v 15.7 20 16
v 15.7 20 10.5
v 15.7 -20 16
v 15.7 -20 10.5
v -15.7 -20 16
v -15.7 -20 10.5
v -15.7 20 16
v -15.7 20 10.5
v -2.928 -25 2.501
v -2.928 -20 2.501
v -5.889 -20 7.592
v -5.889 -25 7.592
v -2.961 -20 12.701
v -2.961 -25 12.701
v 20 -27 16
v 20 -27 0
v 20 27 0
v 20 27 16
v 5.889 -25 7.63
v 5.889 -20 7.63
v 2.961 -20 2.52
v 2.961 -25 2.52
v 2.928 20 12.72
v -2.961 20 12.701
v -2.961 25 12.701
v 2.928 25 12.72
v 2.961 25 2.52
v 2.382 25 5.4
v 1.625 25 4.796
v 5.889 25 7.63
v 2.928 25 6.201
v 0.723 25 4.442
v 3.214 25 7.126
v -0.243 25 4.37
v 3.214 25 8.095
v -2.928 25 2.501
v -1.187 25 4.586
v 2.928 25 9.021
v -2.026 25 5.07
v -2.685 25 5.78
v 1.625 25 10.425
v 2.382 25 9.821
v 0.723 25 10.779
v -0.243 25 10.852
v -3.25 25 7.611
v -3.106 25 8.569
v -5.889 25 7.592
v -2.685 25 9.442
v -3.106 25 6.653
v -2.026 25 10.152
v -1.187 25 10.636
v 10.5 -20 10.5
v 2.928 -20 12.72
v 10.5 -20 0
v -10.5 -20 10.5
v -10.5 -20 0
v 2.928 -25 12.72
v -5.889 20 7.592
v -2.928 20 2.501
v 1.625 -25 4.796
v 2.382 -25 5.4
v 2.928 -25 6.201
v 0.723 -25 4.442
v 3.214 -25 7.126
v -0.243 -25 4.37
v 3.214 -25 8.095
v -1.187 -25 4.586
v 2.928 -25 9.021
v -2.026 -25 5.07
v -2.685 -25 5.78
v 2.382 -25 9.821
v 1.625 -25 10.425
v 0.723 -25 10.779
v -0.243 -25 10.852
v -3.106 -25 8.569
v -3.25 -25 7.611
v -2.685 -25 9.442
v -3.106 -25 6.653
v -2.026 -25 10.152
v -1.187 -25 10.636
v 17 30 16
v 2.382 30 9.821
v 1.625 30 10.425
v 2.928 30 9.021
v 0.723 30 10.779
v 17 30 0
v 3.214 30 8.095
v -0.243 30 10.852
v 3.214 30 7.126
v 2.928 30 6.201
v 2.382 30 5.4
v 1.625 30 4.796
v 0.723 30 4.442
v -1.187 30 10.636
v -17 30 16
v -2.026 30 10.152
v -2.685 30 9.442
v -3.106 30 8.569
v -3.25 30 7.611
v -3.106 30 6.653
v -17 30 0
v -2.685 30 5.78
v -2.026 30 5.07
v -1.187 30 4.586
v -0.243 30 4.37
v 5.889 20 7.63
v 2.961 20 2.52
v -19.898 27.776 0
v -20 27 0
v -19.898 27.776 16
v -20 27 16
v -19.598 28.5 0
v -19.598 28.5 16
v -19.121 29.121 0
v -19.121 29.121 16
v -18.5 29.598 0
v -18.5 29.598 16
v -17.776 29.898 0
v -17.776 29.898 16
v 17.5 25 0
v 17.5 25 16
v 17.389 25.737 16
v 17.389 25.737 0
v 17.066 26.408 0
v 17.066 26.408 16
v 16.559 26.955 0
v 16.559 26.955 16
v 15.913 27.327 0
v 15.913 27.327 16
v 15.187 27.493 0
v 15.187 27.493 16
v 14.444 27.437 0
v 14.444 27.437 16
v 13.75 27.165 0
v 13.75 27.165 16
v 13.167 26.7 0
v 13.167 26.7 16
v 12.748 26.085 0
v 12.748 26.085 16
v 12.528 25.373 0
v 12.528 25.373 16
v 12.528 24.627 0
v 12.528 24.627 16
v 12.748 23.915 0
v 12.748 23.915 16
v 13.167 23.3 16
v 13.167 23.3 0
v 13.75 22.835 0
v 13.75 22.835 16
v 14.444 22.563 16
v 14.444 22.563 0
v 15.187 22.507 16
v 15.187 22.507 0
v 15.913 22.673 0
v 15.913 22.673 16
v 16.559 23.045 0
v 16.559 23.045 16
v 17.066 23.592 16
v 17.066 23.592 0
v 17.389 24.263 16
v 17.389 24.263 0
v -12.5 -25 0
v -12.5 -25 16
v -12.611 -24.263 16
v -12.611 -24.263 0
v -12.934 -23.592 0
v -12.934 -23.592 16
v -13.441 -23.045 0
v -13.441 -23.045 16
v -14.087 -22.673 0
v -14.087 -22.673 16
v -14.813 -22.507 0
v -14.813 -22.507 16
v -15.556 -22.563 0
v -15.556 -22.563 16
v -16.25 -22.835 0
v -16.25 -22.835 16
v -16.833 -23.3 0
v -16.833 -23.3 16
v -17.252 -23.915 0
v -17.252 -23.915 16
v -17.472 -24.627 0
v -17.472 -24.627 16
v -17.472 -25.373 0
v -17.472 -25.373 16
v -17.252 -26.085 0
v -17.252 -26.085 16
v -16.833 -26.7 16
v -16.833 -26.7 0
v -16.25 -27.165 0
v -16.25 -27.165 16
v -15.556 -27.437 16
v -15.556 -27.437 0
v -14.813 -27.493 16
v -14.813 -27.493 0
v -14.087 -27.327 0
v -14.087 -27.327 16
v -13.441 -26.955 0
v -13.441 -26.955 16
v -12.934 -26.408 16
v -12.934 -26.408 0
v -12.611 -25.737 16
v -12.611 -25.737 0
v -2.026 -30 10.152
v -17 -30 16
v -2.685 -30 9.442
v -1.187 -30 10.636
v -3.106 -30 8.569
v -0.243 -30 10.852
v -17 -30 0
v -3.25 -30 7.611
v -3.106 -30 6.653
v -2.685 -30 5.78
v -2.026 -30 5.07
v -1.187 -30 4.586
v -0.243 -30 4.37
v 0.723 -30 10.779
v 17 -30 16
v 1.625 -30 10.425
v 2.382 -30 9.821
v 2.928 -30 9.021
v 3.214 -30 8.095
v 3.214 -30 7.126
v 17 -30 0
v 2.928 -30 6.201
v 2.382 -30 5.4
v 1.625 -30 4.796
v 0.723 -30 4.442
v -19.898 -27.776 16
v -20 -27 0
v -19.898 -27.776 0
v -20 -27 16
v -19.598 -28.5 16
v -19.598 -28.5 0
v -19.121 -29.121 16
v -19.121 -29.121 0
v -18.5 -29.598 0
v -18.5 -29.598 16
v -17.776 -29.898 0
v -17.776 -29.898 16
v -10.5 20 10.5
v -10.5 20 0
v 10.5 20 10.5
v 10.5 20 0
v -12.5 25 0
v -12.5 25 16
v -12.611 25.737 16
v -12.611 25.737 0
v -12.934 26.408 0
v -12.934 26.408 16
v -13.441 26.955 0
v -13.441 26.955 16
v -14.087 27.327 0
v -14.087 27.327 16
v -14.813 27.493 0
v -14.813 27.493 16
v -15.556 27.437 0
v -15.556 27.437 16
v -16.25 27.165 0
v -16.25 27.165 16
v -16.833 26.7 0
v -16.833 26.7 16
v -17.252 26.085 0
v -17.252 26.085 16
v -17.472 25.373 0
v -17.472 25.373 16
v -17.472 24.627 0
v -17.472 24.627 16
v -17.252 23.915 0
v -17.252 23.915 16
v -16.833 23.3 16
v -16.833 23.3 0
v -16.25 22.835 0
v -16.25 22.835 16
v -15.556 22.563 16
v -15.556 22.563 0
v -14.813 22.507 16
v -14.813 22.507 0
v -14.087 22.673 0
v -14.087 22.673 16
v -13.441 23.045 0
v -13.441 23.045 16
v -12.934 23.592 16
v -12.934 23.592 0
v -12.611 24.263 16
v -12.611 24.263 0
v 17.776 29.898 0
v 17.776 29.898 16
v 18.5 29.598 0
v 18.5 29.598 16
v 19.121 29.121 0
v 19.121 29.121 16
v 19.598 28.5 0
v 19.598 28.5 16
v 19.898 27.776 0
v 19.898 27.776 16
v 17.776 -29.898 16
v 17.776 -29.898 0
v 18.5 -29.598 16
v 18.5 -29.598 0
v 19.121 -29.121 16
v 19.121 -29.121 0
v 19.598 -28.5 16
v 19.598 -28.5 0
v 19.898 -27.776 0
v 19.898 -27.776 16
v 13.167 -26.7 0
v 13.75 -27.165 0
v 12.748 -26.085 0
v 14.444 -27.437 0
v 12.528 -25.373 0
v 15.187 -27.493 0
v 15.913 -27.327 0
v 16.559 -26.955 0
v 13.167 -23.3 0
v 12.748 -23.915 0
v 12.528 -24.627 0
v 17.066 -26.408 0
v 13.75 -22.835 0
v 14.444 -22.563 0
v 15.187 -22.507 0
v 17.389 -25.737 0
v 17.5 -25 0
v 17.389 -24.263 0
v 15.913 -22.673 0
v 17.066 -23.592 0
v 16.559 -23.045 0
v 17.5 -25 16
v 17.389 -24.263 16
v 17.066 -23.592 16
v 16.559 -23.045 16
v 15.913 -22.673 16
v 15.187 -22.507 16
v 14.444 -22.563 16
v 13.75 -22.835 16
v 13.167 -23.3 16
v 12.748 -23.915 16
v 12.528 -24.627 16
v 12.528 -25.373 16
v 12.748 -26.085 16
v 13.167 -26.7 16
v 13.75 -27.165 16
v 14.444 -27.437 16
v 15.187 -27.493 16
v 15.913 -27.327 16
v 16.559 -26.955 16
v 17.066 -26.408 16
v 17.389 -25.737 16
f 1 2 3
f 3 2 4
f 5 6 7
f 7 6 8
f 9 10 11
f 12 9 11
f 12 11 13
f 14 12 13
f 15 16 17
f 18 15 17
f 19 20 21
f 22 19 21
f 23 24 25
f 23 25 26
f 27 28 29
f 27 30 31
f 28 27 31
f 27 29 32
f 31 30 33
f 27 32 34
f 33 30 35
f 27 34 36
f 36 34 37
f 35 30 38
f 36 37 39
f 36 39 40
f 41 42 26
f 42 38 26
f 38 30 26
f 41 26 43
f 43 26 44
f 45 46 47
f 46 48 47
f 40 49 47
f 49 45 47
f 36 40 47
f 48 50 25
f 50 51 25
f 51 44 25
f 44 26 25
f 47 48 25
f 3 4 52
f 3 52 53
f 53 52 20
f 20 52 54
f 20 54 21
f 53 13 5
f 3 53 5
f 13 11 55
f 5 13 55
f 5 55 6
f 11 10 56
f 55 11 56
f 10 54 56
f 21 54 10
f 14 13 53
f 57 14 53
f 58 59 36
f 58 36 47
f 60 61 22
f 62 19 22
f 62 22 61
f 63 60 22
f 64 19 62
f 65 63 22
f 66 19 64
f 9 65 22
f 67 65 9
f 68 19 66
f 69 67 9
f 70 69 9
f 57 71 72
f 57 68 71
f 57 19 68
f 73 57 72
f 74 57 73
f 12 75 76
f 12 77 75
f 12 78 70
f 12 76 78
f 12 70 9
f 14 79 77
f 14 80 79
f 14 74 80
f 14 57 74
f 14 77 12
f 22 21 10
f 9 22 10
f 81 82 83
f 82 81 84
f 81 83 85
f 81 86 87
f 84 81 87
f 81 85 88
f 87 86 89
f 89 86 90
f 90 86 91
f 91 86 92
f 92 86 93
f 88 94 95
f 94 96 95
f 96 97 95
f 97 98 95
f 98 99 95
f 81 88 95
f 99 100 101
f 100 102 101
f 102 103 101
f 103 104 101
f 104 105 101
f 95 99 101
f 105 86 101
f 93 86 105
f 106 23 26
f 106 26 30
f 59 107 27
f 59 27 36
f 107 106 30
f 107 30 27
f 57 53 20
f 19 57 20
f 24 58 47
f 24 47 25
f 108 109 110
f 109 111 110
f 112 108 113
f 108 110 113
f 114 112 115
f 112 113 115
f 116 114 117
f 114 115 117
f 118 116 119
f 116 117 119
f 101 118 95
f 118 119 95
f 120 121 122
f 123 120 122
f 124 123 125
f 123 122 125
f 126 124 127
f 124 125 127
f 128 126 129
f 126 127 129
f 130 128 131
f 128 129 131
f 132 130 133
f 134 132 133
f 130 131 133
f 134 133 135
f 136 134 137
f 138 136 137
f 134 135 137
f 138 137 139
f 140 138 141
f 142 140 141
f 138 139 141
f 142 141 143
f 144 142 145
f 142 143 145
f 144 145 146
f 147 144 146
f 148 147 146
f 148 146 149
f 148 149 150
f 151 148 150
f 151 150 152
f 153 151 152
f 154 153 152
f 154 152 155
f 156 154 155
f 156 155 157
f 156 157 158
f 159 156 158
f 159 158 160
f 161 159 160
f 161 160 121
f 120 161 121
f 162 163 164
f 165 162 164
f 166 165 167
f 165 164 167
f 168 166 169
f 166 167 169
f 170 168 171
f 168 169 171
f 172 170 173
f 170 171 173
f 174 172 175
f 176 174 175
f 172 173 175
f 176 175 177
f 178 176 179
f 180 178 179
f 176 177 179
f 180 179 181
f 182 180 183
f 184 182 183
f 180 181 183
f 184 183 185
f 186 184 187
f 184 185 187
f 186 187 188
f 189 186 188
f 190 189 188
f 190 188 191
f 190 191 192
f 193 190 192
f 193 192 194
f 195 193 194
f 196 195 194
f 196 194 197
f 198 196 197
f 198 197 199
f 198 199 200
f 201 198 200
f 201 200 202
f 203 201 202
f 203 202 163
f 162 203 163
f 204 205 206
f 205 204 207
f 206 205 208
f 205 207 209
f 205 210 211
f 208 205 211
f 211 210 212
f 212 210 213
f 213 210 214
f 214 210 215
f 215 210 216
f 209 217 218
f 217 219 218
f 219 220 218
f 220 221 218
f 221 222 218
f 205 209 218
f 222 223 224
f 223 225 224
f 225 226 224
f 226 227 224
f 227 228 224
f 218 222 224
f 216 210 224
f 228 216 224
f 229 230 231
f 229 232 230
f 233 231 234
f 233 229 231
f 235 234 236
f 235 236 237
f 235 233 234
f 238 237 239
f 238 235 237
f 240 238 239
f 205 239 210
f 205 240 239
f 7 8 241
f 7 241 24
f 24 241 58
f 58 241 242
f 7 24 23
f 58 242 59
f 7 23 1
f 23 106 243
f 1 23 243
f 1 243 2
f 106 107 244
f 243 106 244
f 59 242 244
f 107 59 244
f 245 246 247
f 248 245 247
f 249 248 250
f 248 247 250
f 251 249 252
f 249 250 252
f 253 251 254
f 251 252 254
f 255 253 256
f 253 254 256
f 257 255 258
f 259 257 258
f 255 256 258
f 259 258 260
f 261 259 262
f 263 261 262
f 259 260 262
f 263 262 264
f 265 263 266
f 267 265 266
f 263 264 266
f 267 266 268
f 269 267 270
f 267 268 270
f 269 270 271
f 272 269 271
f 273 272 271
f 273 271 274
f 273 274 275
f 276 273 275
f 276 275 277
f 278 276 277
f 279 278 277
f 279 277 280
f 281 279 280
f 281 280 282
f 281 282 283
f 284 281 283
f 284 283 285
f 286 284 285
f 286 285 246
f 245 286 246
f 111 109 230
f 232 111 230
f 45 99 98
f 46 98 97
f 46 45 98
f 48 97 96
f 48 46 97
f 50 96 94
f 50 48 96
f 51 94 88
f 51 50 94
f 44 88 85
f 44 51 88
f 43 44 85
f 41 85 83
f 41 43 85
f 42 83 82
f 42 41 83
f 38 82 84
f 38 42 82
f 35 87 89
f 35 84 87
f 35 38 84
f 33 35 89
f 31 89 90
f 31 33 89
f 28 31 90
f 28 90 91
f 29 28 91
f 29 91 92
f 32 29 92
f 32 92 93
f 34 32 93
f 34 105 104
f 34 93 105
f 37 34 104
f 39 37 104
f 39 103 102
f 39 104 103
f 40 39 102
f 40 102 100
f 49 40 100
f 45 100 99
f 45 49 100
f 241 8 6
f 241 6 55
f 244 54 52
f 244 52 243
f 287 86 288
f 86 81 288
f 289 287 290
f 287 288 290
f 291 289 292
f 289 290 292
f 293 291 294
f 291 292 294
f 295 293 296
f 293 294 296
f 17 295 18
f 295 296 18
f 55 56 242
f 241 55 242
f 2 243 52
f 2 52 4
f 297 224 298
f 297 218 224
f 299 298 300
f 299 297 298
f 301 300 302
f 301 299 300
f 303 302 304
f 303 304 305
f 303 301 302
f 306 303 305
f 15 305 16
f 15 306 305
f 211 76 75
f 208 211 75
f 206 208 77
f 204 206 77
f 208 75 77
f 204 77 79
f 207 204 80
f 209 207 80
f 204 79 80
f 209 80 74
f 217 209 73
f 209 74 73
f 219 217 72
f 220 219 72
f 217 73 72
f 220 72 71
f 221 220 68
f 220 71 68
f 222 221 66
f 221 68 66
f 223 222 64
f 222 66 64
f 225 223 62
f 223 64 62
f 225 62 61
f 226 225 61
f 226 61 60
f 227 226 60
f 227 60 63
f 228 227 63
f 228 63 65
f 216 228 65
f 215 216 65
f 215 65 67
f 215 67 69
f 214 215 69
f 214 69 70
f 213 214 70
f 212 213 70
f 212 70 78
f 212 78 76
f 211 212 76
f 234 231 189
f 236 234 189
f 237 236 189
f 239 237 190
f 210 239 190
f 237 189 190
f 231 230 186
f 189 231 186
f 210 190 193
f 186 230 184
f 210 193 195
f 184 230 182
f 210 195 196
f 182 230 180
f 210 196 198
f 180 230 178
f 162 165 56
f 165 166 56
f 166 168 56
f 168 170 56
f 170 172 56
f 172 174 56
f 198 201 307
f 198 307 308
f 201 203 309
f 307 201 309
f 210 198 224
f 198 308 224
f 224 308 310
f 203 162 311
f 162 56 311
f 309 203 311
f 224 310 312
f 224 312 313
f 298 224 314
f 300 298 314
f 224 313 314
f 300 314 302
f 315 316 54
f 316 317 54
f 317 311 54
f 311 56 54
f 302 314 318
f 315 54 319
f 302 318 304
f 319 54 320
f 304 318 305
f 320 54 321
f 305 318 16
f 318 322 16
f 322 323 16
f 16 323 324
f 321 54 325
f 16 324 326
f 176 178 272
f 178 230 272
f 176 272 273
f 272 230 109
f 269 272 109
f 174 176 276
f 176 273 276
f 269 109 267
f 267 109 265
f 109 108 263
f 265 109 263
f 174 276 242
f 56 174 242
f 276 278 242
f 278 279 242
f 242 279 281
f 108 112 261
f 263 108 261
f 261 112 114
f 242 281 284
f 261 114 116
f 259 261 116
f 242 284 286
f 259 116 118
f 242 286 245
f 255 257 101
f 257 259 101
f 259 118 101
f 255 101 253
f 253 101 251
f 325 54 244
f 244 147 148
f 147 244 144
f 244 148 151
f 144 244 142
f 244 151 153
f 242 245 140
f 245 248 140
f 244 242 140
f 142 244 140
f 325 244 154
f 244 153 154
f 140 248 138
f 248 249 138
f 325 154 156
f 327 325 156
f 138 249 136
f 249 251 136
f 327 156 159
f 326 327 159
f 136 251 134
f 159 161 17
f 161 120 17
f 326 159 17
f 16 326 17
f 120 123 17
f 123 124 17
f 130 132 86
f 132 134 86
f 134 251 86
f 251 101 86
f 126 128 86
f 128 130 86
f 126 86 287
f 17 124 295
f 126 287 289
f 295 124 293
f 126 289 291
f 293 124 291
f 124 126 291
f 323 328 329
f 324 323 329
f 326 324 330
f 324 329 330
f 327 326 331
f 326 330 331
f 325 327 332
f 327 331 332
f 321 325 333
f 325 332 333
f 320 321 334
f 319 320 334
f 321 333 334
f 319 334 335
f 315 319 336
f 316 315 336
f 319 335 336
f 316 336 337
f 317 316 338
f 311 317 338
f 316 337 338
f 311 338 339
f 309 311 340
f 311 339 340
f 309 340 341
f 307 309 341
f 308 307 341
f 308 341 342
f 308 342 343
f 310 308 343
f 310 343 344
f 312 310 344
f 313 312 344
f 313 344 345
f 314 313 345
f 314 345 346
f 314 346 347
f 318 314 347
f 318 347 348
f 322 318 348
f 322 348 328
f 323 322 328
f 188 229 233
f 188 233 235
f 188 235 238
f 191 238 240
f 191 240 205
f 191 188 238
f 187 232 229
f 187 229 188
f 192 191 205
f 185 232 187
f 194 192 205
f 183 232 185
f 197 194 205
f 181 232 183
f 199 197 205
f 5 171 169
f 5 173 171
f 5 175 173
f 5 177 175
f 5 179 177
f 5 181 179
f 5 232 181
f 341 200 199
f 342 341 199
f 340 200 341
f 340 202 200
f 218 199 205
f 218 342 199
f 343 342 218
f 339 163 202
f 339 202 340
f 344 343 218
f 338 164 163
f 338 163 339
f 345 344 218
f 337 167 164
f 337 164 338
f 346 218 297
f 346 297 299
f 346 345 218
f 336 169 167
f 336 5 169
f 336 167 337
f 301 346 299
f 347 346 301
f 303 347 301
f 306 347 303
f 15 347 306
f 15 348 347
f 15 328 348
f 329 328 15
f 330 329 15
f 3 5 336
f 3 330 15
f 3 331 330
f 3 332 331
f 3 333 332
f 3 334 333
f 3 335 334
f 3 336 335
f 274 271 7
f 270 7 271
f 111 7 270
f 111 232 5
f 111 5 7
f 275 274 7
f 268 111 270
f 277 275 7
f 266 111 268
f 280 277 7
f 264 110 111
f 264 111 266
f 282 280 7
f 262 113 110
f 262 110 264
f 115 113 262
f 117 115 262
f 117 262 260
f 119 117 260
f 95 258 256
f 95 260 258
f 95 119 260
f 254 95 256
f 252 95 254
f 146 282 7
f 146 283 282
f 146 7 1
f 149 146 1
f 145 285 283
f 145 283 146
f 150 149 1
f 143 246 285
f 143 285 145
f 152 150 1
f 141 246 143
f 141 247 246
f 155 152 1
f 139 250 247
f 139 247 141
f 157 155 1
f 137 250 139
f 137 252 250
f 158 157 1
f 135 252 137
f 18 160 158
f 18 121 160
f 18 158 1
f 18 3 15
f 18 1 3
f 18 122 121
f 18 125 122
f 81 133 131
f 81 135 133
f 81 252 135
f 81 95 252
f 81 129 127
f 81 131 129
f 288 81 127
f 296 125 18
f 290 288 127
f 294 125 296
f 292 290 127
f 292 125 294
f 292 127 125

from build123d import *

# Parameters (mm, degrees)
F0_W          = 5.2
F0_H          = 10
F1_DEPTH      = 16
F0_H_2        = 40
F2_DEPTH      = 10.5
F3_R          = 3.25
F4_DEPTH      = 25
F4_DEPTH_BACK = 62.6
F5_DEPTH      = 5
F5_DEPTH_BACK = 45
F6_R          = 2.5
F7_DEPTH      = 20
F8_R          = 3


with BuildPart() as f1:
    # F0 (on Top) → F1 (new body)
    with BuildSketch(Plane.XY):
        with Locations((-13.1, 25)):
            Rectangle(F0_W, F0_H)
        Polygon((-15.7, -30), (-15.7, -20), (-15.7, 20), (-15.7, 30), (-20, 30), (-20, -30), align=None)
        with Locations((-13.1, -25)):
            Rectangle(F0_W, F0_H)
        Polygon((10, -30), (10.5, -30), (10.5, -20), (-10.5, -20), (-10.5, -30), (-10, -30), align=None)
        with Locations((13.1, -25)):
            Rectangle(F0_W, F0_H)
        Polygon((15.7, -30), (20, -30), (20, 30), (15.7, 30), (15.7, 20), (15.7, -20), align=None)
        with Locations((13.1, 25)):
            Rectangle(F0_W, F0_H)
        Polygon((10.5, 20), (10.5, 30), (10, 30), (-10, 30), (-10.5, 30), (-10.5, 20), align=None)
    extrude(amount=F1_DEPTH)

    # F0 (on Top) → F2 (join)
    with BuildSketch(Plane.XY):
        with Locations((-13.1, 0)):
            Rectangle(F0_W, F0_H_2)
        with Locations((13.1, 0)):
            Rectangle(F0_W, F0_H_2)
    extrude(amount=F2_DEPTH)

    # F3 (on face) → F4 (cut, two sides)
    with BuildSketch(Plane(origin=(0, -20, 0), x_dir=(-1, 0, 0), z_dir=(0, 1, 0))) as f4_sk:
        with Locations((0, 7.6108775102)):
            Circle(F3_R)
    extrude(amount=-F4_DEPTH, mode=Mode.SUBTRACT)
    extrude(f4_sk.sketch, amount=F4_DEPTH_BACK, mode=Mode.SUBTRACT)

    # F3 (on face) → F5 (cut, two sides)
    with BuildSketch(Plane(origin=(0, -20, 0), x_dir=(-1, 0, 0), z_dir=(0, 1, 0))) as f5_sk:
        Polygon((-2.9280820296, 12.7203134505), (-5.8889423381, 7.6298020583), (-2.9608603085, 2.520366118), (2.9280820296, 2.5014415699), (5.8889423381, 7.591952962), (2.9608603085, 12.7013889023), align=None)
        with Locations((0, 7.6108775102)):
            Circle(F3_R, mode=Mode.SUBTRACT)
    extrude(amount=-F5_DEPTH, mode=Mode.SUBTRACT)
    extrude(f5_sk.sketch, amount=F5_DEPTH_BACK, mode=Mode.SUBTRACT)

    # F6 (on face) → F7 (cut)
    with BuildSketch(Plane.XY.offset(16)):
        with Locations((-15, -25)):
            Circle(F6_R)
        with Locations((15, -25)):
            Circle(F6_R)
        with Locations((15, 25)):
            Circle(F6_R)
        with Locations((-15, 25)):
            Circle(F6_R)
    extrude(amount=-F7_DEPTH, mode=Mode.SUBTRACT)

    # F8
    f8_edges = [f1.edges().sort_by_distance(p)[0] for p in [
        (20, -30, 8),
        (20, 30, 8),
        (-20, 30, 8),
        (-20, -30, 8),
    ]]
    fillet(f8_edges, radius=F8_R)


solid = f1.part
